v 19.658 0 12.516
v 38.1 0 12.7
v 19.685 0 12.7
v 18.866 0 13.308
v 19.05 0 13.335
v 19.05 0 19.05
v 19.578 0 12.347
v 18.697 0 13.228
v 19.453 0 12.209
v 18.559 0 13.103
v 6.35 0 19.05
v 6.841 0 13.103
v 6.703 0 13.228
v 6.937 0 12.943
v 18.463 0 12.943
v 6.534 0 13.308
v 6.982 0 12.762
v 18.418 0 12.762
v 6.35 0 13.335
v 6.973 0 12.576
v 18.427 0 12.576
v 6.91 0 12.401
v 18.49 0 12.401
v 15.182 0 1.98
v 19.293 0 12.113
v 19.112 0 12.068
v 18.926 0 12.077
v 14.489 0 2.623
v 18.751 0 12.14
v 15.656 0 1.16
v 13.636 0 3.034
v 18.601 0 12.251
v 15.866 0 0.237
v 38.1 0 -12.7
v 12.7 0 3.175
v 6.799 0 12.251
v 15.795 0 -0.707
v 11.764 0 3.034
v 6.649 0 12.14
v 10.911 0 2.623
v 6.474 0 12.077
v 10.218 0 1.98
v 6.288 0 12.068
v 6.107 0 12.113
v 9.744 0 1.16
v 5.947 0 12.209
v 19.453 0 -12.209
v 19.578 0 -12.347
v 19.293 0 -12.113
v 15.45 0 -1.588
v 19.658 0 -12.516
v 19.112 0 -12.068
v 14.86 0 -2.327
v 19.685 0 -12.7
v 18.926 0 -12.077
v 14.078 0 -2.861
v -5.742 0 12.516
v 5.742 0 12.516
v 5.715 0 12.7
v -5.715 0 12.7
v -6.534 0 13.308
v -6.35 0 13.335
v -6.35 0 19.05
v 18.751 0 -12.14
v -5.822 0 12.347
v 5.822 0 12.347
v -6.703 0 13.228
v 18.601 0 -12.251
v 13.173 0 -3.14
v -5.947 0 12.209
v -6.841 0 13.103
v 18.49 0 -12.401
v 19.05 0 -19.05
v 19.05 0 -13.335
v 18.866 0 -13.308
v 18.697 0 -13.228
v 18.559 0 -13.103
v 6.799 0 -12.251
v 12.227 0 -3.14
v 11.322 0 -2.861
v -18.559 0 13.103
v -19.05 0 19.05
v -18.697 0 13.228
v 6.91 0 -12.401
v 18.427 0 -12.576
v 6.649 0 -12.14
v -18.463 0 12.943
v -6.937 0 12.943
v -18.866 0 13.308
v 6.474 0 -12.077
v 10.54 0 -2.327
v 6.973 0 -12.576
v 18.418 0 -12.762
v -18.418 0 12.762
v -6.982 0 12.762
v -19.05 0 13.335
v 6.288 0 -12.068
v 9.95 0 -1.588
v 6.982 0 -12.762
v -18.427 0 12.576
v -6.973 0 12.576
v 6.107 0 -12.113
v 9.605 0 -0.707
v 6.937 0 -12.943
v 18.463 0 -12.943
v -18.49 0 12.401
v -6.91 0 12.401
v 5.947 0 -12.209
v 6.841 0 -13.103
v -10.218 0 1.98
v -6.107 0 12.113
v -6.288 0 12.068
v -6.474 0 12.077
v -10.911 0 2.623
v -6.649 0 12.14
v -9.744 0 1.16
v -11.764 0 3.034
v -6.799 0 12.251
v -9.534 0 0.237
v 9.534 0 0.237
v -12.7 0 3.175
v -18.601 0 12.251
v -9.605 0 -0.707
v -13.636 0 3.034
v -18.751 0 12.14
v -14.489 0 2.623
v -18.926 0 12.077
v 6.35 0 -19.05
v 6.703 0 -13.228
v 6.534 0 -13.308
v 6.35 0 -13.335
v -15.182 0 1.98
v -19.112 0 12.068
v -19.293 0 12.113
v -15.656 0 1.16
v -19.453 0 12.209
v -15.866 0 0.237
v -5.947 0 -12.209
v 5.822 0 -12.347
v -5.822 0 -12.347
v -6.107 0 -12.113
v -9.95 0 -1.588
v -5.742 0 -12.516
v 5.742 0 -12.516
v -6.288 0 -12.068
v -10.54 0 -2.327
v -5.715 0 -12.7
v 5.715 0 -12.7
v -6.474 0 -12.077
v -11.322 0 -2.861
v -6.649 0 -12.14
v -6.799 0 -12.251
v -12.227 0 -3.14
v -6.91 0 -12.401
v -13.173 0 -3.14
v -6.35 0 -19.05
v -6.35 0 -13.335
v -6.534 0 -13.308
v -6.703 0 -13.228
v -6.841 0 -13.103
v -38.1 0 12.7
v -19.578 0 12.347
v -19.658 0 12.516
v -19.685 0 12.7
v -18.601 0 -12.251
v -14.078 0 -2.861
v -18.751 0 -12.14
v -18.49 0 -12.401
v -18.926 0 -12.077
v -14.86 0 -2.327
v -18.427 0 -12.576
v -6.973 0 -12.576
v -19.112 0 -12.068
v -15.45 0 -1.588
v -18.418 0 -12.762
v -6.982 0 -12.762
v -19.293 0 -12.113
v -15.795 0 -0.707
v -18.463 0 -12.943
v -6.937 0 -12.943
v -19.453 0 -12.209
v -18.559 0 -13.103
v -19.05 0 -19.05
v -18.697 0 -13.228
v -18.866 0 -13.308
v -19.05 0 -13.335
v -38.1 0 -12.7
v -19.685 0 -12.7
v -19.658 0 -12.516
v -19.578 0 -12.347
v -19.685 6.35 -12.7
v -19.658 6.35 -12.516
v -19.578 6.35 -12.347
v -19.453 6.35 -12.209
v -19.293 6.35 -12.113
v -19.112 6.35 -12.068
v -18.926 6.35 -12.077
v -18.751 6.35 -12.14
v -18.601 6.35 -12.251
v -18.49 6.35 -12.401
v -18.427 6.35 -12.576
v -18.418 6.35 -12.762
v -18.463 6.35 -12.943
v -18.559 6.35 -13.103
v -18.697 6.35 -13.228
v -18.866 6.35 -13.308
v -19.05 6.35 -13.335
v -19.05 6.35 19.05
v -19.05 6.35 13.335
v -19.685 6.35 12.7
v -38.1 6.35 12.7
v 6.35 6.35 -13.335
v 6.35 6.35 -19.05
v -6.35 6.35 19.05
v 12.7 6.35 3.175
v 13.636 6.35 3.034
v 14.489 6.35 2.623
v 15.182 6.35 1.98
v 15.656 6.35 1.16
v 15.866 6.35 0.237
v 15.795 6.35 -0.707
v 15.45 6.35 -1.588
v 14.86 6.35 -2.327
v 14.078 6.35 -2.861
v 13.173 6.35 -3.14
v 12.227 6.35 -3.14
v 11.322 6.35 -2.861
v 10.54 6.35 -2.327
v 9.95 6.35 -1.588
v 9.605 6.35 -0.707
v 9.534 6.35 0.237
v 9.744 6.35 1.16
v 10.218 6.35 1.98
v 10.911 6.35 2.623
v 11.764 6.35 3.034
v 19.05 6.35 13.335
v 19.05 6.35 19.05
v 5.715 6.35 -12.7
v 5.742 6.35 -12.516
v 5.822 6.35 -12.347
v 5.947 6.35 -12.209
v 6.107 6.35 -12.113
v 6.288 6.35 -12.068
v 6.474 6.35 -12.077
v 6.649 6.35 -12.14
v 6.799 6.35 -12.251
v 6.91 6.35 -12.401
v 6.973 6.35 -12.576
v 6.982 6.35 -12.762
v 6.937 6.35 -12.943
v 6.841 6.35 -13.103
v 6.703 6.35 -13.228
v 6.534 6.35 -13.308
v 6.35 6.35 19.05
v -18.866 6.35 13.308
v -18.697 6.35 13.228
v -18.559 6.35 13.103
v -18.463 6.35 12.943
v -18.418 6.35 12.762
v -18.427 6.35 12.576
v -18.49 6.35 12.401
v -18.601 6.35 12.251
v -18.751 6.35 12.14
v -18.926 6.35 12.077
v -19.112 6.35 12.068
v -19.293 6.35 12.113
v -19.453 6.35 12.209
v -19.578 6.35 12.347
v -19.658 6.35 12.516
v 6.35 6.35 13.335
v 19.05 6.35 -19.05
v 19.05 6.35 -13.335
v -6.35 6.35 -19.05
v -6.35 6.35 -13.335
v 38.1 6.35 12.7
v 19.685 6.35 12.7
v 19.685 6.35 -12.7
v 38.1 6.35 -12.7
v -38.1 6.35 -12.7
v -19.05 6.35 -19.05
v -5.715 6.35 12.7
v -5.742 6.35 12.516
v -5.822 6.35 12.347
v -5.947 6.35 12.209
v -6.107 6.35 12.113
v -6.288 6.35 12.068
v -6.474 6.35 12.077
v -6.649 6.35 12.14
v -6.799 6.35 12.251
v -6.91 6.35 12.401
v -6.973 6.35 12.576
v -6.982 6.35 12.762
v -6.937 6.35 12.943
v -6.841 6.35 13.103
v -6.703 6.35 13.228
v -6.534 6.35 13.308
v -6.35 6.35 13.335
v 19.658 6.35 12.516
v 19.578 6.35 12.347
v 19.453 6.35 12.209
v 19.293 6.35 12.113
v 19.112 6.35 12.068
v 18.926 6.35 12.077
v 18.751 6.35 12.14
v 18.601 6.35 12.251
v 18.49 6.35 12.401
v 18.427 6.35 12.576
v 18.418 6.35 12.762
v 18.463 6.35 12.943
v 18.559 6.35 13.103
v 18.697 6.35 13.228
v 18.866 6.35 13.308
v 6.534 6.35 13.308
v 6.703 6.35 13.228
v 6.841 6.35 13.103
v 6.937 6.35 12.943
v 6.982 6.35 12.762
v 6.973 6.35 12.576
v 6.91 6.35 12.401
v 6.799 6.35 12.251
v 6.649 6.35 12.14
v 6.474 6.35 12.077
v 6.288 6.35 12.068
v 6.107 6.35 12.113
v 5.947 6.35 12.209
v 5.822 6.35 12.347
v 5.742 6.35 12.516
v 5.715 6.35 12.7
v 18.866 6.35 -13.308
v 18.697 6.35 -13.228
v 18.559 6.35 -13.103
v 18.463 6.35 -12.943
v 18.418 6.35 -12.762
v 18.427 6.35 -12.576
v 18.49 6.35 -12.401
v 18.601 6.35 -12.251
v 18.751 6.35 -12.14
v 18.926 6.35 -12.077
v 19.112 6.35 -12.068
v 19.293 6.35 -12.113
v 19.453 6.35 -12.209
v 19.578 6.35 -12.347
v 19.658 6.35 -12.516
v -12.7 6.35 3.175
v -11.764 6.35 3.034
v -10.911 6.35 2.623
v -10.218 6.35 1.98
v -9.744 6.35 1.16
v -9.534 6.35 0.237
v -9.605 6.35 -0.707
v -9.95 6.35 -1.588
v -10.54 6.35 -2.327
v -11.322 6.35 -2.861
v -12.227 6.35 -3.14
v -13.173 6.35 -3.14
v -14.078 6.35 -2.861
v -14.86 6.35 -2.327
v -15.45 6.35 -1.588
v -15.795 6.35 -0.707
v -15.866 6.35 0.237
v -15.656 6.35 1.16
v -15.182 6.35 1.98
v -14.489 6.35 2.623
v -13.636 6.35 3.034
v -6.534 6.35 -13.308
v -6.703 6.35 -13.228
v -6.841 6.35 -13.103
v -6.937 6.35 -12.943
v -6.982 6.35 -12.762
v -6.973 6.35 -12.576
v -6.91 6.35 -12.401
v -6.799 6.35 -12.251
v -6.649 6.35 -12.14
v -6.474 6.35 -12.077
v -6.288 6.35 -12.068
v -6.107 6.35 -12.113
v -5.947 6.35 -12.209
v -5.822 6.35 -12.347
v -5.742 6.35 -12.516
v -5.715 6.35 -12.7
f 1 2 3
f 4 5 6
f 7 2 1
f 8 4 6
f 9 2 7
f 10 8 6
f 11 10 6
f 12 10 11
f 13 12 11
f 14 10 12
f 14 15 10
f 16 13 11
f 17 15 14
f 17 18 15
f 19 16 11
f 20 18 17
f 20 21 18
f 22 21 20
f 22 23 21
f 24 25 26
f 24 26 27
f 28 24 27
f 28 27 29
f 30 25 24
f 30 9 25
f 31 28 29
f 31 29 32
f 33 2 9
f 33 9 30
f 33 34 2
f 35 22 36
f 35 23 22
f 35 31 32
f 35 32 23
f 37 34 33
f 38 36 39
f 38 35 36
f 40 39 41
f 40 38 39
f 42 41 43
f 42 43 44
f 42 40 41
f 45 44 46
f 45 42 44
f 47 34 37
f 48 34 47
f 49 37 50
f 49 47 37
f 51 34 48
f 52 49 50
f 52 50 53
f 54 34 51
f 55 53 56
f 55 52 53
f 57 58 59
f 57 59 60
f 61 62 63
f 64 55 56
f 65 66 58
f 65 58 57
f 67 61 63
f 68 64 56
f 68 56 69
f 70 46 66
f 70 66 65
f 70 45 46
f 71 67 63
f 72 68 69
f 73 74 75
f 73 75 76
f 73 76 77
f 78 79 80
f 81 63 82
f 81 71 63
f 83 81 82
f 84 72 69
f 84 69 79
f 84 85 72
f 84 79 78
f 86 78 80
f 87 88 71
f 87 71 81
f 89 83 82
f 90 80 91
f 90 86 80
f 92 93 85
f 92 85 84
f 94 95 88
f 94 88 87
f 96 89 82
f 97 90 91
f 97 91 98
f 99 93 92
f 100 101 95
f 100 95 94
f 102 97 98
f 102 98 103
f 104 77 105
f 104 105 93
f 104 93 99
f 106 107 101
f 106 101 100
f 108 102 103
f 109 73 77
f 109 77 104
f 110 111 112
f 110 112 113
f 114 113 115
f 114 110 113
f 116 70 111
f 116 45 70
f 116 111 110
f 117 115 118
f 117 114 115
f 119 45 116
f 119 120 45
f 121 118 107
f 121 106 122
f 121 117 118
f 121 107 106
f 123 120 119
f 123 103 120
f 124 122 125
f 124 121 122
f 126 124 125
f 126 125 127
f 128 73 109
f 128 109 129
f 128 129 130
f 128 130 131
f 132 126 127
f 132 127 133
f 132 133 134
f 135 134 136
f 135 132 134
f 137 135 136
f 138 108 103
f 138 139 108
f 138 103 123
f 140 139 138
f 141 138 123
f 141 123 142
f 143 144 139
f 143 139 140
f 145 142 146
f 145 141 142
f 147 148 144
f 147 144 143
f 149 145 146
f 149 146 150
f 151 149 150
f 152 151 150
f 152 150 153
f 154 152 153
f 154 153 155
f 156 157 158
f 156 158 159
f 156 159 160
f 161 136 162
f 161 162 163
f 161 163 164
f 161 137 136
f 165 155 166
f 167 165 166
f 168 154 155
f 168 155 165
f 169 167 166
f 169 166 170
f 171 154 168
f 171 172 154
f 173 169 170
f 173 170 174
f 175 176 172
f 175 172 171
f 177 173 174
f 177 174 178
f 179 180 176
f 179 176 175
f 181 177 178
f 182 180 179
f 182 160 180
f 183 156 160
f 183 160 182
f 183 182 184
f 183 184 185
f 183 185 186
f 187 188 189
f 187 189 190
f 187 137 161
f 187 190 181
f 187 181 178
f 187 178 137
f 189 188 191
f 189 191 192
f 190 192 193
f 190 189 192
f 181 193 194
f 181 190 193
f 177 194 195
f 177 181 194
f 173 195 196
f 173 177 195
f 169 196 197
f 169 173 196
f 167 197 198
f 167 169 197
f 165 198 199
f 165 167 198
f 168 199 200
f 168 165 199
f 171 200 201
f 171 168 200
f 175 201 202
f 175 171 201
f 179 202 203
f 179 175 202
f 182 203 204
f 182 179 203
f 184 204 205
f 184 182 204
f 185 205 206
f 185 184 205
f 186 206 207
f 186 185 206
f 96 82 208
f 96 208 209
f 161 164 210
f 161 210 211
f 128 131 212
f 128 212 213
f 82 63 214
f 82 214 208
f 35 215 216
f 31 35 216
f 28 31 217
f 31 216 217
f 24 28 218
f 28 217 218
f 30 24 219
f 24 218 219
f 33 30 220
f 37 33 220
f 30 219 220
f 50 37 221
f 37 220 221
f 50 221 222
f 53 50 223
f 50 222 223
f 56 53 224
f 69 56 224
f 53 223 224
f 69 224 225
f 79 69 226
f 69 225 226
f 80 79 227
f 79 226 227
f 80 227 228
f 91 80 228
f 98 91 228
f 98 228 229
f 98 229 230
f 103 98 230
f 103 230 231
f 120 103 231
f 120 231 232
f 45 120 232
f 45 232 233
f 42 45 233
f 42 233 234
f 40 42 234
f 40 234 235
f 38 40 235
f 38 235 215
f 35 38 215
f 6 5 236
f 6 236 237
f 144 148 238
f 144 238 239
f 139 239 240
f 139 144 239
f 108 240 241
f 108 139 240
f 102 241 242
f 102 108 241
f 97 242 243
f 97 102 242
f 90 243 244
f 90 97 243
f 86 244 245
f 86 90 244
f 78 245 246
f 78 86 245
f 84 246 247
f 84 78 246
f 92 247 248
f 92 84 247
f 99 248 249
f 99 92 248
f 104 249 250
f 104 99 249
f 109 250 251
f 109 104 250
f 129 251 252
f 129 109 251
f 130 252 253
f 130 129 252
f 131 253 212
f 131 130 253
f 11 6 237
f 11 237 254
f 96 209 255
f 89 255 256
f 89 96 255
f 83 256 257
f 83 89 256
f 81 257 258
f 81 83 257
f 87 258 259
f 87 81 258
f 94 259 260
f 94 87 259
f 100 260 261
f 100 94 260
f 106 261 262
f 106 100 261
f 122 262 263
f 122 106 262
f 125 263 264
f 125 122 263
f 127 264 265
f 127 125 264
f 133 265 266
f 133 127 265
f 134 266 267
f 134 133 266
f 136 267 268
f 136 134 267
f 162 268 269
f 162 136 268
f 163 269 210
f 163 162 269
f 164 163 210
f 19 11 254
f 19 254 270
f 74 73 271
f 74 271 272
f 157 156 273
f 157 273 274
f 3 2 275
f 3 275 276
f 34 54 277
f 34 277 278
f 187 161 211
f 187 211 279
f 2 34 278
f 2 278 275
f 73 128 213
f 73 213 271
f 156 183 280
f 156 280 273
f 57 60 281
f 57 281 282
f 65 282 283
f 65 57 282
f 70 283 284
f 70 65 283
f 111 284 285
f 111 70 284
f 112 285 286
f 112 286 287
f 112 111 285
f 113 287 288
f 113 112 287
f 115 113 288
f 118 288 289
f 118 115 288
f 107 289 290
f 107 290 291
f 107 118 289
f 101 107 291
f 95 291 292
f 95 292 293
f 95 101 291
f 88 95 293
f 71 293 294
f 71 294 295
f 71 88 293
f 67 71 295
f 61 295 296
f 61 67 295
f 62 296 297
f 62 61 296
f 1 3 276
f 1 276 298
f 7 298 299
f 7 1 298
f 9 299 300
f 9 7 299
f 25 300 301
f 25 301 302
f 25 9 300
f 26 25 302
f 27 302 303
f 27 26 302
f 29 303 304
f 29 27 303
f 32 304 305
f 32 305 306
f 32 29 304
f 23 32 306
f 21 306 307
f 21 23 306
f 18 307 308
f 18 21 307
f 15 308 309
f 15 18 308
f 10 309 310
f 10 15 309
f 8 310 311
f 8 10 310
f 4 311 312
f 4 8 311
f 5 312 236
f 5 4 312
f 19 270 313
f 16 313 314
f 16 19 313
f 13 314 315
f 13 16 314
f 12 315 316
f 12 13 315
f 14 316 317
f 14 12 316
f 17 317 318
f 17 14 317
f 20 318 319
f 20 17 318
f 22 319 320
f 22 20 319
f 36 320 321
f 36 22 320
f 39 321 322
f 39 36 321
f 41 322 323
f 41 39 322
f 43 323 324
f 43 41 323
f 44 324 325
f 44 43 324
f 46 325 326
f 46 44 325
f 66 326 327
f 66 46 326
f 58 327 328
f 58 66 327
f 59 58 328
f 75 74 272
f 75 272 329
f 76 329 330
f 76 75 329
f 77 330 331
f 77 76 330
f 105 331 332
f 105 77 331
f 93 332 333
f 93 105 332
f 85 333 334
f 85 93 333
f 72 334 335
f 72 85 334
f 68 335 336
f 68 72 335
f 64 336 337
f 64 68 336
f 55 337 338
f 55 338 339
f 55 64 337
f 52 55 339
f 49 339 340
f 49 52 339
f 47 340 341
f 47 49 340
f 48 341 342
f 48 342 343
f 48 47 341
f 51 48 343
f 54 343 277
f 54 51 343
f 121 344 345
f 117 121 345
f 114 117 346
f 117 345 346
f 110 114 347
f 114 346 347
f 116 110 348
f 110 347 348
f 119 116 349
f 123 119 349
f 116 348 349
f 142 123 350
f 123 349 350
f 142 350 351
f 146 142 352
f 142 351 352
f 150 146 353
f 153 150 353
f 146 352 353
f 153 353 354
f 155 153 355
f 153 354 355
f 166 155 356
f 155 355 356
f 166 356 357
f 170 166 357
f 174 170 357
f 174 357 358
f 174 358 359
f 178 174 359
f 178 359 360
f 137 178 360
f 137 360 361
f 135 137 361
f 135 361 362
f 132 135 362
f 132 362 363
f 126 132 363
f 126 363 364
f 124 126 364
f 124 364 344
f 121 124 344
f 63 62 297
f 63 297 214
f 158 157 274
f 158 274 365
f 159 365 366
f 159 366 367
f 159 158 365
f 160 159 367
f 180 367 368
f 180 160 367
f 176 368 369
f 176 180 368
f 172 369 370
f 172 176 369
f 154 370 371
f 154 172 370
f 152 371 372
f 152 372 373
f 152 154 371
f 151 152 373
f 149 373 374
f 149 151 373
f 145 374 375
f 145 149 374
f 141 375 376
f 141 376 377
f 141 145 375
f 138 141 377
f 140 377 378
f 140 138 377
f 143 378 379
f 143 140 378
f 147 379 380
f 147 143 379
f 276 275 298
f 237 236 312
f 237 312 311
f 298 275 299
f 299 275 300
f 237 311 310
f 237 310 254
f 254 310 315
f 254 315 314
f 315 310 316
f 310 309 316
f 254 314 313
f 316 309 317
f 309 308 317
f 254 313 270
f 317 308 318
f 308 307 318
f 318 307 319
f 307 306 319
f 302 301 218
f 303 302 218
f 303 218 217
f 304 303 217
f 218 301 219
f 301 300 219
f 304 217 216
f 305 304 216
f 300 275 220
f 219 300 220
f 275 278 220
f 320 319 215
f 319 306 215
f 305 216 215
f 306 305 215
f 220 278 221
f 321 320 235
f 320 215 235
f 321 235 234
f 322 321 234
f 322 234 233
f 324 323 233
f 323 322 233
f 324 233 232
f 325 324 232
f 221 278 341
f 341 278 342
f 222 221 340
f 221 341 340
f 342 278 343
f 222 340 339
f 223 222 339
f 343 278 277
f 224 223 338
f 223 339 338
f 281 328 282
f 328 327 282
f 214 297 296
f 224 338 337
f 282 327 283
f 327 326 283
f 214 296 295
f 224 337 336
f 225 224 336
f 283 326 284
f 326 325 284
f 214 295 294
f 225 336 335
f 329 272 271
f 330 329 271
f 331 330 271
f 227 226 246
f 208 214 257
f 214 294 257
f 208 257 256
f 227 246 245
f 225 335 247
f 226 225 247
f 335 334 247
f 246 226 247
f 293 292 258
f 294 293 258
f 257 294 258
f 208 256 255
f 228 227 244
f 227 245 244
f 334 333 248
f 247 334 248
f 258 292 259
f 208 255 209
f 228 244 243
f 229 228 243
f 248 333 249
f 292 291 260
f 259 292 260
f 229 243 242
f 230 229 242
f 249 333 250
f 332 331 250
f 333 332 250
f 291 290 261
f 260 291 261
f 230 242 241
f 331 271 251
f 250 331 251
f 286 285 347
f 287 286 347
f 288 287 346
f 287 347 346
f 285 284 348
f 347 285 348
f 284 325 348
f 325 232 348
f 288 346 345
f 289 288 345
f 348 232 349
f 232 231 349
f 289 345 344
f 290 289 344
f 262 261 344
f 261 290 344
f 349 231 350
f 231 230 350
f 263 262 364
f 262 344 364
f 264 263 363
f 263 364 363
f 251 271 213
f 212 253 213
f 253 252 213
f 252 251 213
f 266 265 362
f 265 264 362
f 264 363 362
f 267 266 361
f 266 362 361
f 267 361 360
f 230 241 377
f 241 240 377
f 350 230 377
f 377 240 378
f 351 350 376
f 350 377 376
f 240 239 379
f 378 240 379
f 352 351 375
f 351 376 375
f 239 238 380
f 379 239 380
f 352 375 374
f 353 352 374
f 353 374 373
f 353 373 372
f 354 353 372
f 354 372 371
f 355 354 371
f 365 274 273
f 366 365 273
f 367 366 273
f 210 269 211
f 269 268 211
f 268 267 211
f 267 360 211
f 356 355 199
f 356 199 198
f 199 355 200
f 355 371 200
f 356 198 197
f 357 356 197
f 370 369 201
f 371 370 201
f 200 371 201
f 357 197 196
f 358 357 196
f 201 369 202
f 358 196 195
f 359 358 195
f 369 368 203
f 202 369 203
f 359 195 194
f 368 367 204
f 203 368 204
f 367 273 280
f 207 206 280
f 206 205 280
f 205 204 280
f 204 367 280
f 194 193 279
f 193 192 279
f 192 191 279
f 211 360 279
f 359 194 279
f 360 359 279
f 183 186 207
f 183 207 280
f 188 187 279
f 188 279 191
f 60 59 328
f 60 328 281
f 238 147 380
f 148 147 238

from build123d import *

# Parameters (mm, degrees)
BOSS_EXTRUDE1_DEPTH = 6.35
CUT_EXTRUDE1_REACH  = 45.068
SKETCH2_R           = 3.175
CUT_EXTRUDE2_START  = -6.35
SKETCH4_R           = 0.635
CUT_EXTRUDE2_DEPTH  = 6.35


with BuildPart() as part:
    # Sketch1 → Boss-Extrude1 (new body)
    with BuildSketch(Plane(origin=(0, 0, 0), x_dir=(1, 0, 0), z_dir=(0, 1, 0))):
        Polygon((-19.05, 12.7), (-19.05, 19.05), (-6.35, 19.05), (-6.35, 12.7), (6.35, 12.7), (6.35, 19.05), (19.05, 19.05), (19.05, 12.7), (38.1, 12.7), (38.1, -12.7), (19.05, -12.7), (19.05, -19.05), (6.35, -19.05), (6.35, -12.7), (-6.35, -12.7), (-6.35, -19.05), (-19.05, -19.05), (-19.05, -12.7), (-38.1, -12.7), (-38.1, 12.7), align=None)
    extrude(amount=BOSS_EXTRUDE1_DEPTH)

    # Sketch2 → Cut-Extrude1 (cut, up to next)
    with BuildSketch(Plane(origin=(0, 6.35, 0), x_dir=(1, 0, 0), z_dir=(0, 1, 0)), mode=Mode.PRIVATE) as cut_extrude1_sk1:
        with Locations(Location((-12.7, 0, 0), (0, 0, 270))):
            Circle(SKETCH2_R)
    cut_extrude1_tool1 = extrude(cut_extrude1_sk1.sketch, amount=-CUT_EXTRUDE1_REACH, mode=Mode.PRIVATE) & part.part
    # Sketch2 → Cut-Extrude1 (cut, up to next)
    with BuildSketch(Plane(origin=(0, 6.35, 0), x_dir=(1, 0, 0), z_dir=(0, 1, 0)), mode=Mode.PRIVATE) as cut_extrude1_sk2:
        with Locations(Location((12.7, 0, 0), (0, 0, 270))):
            Circle(SKETCH2_R)
    cut_extrude1_tool2 = extrude(cut_extrude1_sk2.sketch, amount=-CUT_EXTRUDE1_REACH, mode=Mode.PRIVATE) & part.part
    add(cut_extrude1_tool1.solids().sort_by_distance((-12.7, 6.35, 0))[0], mode=Mode.SUBTRACT)
    add(cut_extrude1_tool2.solids().sort_by_distance((12.7, 6.35, 0))[0], mode=Mode.SUBTRACT)

    # Sketch4 → Cut-Extrude2 (cut)
    with BuildSketch(Plane(origin=(0, 6.35, 0), x_dir=(1, 0, 0), z_dir=(0, 1, 0)).offset(CUT_EXTRUDE2_START)):
        with Locations((-19.05, 12.7)):
            Circle(SKETCH4_R)
    cut_extrude2 = extrude(amount=CUT_EXTRUDE2_DEPTH, mode=Mode.SUBTRACT)

    # Sketch-Pattern1: Cut-Extrude2 at 7 more places
    with Locations((12.7, 0, 0), (25.4, 0, 0), (38.1, 0, 0), (38.1, 0, 25.4), (25.4, 0, 25.4), (12.7, 0, 25.4), (0, 0, 25.4)):
        add(cut_extrude2, mode=Mode.SUBTRACT)


solid = part.part
